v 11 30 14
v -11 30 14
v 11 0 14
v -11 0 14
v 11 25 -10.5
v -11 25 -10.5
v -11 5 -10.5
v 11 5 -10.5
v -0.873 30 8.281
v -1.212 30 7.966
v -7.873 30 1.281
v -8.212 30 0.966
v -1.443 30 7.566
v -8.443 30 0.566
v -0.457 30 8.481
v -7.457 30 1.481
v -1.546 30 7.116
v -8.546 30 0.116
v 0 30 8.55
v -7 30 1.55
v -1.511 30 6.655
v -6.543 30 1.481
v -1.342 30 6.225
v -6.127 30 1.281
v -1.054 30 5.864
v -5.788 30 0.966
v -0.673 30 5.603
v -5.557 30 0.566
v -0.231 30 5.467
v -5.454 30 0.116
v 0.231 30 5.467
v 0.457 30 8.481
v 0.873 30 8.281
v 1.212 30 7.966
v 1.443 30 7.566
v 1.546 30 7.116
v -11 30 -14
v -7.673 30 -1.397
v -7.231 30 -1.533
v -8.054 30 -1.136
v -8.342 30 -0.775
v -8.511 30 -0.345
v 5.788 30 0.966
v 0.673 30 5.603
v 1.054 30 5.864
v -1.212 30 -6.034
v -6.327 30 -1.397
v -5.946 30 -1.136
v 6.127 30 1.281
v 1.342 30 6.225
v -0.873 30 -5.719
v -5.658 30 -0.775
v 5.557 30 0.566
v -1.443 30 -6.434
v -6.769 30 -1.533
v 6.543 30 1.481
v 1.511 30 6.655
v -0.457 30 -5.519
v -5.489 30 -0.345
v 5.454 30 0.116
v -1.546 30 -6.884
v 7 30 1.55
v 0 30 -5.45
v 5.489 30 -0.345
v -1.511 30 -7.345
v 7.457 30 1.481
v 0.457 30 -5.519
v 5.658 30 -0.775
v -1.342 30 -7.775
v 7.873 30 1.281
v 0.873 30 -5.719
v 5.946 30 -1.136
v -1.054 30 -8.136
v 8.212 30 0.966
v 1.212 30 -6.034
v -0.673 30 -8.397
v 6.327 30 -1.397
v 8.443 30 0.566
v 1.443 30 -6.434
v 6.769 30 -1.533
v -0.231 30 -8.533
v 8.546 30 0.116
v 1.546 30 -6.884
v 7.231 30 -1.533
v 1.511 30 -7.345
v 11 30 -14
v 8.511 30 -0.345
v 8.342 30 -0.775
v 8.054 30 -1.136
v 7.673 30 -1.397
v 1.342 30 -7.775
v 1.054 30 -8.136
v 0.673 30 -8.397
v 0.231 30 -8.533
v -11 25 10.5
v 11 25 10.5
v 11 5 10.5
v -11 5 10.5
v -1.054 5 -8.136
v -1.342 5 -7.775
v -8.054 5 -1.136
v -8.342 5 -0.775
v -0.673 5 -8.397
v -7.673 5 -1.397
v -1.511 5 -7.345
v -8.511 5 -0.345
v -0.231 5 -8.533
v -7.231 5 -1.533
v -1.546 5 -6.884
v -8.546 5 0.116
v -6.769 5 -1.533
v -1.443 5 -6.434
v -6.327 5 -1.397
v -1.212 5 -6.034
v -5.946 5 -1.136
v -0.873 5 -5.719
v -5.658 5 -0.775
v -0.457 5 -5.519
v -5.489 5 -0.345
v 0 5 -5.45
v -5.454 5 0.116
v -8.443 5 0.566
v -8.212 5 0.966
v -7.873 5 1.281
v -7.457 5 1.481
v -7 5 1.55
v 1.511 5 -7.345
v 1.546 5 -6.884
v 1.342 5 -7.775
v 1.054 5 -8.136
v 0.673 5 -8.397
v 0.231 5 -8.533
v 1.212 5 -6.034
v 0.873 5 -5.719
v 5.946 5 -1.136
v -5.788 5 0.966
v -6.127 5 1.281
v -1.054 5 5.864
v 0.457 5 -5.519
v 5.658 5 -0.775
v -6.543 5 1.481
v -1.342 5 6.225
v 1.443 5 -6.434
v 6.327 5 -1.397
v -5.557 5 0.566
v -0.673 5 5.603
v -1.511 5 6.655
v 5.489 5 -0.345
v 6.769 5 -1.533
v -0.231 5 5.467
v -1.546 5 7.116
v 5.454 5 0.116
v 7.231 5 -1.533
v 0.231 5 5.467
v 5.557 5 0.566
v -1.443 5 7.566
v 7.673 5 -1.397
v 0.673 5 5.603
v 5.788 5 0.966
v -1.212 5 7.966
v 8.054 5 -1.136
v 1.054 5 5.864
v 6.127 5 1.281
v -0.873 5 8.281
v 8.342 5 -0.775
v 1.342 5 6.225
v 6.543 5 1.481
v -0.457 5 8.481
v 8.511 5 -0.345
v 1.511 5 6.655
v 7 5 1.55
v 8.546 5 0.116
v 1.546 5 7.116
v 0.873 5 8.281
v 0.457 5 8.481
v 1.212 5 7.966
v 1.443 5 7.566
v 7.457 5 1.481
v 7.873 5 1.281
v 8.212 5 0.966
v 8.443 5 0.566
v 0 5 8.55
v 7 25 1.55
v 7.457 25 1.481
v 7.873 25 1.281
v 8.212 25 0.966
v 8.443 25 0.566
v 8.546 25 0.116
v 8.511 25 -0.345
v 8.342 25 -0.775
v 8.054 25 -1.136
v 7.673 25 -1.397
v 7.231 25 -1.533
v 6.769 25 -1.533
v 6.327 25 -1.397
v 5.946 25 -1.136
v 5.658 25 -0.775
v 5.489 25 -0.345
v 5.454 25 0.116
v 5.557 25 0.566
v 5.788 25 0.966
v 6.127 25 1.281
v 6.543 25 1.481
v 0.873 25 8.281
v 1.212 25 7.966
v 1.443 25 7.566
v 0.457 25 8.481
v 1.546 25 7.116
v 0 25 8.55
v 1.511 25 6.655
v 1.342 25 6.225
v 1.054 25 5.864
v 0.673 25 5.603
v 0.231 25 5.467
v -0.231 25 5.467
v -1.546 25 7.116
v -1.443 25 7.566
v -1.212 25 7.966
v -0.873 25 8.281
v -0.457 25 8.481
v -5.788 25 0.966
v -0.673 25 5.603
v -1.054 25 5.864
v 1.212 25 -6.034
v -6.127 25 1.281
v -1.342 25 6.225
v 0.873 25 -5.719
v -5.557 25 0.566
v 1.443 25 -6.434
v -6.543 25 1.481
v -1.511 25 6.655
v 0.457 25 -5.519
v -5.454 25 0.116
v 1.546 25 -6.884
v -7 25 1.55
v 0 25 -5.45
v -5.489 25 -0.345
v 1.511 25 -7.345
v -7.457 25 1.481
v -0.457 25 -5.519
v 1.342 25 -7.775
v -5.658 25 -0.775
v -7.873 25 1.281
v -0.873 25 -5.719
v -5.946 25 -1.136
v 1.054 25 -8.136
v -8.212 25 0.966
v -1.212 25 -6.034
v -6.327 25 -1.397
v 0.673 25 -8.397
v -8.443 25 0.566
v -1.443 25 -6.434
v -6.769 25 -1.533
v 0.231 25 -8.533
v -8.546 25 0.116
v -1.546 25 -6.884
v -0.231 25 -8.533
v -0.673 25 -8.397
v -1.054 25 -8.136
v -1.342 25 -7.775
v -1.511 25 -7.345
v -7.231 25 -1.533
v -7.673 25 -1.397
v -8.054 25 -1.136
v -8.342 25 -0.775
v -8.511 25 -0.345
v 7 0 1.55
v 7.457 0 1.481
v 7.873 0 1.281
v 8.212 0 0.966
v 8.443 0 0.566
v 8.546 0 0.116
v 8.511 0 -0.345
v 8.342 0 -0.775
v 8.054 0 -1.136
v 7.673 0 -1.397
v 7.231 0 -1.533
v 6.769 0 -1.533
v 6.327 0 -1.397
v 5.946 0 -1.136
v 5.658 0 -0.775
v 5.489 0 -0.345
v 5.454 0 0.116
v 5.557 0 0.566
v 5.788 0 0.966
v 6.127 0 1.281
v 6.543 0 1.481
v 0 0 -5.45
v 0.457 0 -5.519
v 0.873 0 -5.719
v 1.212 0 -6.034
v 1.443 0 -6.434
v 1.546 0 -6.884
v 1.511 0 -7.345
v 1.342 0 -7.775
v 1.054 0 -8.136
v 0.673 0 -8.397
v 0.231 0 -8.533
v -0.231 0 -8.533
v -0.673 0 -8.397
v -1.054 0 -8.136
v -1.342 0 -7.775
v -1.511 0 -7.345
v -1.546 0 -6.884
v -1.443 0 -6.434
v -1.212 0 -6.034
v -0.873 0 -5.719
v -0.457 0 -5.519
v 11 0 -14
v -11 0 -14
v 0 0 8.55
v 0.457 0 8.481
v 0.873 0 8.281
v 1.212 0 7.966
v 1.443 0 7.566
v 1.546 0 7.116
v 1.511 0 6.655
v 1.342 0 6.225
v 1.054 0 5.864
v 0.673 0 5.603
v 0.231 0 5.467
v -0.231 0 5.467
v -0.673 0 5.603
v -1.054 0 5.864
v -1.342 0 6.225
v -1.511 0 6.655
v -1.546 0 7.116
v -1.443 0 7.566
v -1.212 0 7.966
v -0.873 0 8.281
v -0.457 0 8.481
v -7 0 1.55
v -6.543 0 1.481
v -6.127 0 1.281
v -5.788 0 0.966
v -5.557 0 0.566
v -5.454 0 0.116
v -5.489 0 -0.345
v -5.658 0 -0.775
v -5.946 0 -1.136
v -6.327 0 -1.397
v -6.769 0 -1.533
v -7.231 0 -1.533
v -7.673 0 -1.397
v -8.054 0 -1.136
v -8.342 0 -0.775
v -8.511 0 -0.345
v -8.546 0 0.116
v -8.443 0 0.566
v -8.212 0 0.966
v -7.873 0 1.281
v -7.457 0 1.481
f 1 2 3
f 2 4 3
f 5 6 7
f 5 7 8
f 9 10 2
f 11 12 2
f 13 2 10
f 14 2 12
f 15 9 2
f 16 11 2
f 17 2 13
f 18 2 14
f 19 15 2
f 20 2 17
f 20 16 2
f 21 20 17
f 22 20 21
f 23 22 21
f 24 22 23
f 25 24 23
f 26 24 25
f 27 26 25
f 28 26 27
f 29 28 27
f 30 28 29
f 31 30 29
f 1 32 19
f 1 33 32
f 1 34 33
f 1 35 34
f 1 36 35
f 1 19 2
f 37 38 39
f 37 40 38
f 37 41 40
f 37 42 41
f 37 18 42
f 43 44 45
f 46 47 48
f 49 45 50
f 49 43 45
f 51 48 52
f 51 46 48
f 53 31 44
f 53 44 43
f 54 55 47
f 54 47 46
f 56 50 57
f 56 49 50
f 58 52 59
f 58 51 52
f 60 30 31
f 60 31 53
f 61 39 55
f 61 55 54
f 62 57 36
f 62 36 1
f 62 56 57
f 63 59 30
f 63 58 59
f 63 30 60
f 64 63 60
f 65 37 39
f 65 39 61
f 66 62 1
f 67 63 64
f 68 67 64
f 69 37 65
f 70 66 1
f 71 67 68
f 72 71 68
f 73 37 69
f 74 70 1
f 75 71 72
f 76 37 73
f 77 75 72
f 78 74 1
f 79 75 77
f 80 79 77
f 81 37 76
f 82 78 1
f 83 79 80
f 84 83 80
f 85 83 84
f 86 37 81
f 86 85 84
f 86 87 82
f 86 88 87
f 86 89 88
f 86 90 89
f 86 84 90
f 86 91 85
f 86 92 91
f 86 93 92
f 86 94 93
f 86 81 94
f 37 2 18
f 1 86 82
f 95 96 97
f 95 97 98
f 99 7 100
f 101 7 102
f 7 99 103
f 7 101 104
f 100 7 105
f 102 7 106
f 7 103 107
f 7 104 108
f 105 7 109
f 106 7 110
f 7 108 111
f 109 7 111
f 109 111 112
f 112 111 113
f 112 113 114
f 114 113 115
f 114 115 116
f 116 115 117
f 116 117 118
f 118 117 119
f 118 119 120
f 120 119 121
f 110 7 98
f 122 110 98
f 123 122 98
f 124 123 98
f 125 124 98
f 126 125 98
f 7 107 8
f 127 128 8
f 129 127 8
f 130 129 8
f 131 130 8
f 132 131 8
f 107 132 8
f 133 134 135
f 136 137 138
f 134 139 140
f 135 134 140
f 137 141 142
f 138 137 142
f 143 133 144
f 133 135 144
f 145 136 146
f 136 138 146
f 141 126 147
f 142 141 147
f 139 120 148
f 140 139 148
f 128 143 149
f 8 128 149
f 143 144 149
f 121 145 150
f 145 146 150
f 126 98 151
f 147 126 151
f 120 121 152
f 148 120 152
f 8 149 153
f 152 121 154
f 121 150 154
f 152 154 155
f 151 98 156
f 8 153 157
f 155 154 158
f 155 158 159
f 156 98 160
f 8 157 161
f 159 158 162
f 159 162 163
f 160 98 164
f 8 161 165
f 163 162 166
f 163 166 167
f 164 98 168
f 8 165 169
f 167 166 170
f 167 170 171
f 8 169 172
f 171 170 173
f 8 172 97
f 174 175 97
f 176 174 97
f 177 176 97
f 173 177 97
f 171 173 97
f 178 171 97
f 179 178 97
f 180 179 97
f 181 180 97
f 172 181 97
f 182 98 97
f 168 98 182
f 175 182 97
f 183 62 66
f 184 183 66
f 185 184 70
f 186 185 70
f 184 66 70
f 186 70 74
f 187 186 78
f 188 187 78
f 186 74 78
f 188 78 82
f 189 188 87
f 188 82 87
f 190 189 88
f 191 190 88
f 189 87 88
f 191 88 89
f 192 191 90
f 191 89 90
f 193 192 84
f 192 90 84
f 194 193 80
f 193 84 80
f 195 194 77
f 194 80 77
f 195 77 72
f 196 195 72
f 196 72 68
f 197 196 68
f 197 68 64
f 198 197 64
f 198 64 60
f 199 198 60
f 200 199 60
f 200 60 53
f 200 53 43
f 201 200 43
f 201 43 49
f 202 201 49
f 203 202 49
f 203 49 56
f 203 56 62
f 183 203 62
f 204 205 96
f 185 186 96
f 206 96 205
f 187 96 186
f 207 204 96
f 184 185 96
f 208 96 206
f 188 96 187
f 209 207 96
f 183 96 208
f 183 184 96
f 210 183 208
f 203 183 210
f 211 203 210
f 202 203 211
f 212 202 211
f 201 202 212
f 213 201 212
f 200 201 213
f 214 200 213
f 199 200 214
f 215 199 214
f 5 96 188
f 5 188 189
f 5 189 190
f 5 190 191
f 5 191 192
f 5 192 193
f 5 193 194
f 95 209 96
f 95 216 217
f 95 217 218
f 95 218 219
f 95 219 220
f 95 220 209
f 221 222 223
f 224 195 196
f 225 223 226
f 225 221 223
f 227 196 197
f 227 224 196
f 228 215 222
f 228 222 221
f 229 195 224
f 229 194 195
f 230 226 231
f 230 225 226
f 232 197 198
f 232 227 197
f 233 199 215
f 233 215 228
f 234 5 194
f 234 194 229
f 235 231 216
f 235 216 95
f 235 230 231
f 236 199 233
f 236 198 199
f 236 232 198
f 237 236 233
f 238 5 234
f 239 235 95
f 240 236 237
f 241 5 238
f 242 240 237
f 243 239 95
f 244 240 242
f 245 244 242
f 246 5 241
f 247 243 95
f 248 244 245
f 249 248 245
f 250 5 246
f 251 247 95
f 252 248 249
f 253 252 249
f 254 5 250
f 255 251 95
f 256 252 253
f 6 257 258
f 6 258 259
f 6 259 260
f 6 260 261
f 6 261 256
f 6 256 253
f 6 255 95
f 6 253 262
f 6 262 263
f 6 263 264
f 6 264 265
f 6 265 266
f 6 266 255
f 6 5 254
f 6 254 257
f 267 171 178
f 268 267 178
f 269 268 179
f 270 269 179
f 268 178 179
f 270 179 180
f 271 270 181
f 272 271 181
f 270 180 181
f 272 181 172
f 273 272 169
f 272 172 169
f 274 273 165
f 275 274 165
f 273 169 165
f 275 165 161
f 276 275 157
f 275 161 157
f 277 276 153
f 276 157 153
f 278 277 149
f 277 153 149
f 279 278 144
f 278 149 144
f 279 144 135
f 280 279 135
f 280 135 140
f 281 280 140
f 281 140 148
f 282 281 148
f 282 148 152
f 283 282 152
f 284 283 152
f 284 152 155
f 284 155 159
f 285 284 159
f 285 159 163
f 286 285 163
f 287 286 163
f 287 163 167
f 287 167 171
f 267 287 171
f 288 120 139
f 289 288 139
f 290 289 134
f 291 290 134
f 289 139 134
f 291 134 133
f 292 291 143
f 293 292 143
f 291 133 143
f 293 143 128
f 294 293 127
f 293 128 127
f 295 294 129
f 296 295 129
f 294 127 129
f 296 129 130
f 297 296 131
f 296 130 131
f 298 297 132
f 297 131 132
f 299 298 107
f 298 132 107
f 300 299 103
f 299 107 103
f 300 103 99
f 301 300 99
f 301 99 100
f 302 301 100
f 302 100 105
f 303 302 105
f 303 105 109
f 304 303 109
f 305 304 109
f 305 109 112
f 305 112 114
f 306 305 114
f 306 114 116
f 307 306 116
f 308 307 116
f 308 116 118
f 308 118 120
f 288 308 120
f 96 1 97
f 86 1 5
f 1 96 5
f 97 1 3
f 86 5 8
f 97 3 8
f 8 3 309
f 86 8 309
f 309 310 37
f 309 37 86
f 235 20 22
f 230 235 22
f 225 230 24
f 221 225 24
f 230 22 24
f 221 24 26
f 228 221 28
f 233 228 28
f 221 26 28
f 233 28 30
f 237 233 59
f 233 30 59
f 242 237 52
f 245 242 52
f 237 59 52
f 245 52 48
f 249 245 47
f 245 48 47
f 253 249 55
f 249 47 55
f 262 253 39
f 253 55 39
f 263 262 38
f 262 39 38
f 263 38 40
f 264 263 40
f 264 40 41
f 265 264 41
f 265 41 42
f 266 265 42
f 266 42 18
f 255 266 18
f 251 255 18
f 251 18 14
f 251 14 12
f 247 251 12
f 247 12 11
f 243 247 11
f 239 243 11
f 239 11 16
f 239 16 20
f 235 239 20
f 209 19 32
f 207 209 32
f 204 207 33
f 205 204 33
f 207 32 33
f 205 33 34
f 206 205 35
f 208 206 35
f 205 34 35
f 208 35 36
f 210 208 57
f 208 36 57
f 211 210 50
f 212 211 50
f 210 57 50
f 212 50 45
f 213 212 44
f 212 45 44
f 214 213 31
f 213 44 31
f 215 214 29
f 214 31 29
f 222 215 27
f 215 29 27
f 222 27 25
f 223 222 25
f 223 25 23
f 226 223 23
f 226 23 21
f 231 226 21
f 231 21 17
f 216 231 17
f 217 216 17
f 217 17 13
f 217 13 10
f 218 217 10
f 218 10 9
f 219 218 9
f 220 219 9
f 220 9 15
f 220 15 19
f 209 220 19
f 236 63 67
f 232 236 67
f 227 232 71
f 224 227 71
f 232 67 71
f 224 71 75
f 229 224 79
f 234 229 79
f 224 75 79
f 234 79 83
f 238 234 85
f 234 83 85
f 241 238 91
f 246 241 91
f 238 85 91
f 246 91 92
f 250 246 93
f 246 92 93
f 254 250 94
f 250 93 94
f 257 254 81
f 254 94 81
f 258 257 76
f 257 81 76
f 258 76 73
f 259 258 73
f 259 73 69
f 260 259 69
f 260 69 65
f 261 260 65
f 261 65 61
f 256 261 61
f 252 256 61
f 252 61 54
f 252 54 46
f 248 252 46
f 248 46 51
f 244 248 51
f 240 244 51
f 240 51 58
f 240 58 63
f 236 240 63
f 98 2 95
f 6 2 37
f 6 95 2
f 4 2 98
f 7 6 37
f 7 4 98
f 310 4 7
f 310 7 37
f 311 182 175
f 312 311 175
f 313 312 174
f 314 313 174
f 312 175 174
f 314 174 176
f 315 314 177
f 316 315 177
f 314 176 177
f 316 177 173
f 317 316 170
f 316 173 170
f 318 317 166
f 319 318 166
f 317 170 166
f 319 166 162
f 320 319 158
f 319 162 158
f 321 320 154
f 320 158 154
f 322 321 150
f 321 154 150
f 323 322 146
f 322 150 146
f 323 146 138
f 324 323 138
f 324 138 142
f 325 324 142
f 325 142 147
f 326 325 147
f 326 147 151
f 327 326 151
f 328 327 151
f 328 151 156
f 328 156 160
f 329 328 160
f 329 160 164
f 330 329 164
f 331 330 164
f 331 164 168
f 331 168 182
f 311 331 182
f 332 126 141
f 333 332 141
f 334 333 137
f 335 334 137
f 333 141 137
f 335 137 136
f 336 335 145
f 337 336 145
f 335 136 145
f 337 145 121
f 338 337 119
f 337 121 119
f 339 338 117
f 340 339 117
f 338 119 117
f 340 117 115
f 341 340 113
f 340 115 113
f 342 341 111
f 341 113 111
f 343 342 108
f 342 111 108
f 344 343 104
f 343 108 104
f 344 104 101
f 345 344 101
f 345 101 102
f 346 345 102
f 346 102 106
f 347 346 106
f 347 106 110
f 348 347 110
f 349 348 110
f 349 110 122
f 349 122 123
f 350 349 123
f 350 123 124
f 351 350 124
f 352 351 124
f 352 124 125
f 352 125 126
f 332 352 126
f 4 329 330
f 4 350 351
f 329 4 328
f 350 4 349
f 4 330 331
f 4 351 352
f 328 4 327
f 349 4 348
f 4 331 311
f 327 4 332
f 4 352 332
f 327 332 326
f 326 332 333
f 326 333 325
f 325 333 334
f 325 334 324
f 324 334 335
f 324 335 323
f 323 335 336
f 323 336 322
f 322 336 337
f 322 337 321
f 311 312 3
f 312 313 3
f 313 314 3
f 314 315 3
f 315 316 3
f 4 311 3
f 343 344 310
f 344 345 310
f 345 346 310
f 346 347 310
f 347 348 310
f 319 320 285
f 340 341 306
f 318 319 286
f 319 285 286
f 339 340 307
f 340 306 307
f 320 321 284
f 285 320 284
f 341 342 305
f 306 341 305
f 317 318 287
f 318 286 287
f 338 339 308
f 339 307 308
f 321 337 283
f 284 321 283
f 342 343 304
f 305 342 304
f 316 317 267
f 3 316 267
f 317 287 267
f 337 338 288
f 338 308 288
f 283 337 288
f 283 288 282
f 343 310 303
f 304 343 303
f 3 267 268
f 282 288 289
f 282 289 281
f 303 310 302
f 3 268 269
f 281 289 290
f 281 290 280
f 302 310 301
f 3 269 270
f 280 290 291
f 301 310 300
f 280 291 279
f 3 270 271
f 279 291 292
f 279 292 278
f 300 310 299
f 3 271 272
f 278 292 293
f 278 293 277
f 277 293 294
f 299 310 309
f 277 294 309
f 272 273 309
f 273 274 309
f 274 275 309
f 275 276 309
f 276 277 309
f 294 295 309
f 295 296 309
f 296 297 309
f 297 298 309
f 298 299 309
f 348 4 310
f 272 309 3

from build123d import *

# Parameters (mm, degrees)
SKETCH1_W           = 22
SKETCH1_H           = 28
BOSS_EXTRUDE1_DEPTH = 5
SKETCH2_W           = 22
SKETCH2_H           = 5
BOSS_EXTRUDE2_DEPTH = 20
SKETCH3_W           = 22
SKETCH3_H           = 28
BOSS_EXTRUDE3_DEPTH = 5
SKETCH4_R           = 1.55
CUT_EXTRUDE1_DEPTH  = 30
SKETCH5_W           = 22
SKETCH5_H           = 20
CUT_EXTRUDE2_DEPTH  = 1.5
SKETCH6_W           = 22
SKETCH6_H           = 20
CUT_EXTRUDE3_DEPTH  = 1.5


with BuildPart() as part:
    # Sketch1 → Boss-Extrude1 (new body)
    with BuildSketch(Plane(origin=(0, 0, 0), x_dir=(1, 0, 0), z_dir=(0, 1, 0))):
        Rectangle(SKETCH1_W, SKETCH1_H)
    extrude(amount=BOSS_EXTRUDE1_DEPTH)

    # Sketch2 → Boss-Extrude2 (add)
    with BuildSketch(Plane(origin=(0, 5, 0), x_dir=(1, 0, 0), z_dir=(0, 1, 0))):
        with Locations((0, -11.5)):
            Rectangle(SKETCH2_W, SKETCH2_H)
        with Locations((0, 11.5)):
            Rectangle(SKETCH2_W, SKETCH2_H)
    extrude(amount=BOSS_EXTRUDE2_DEPTH)

    # Sketch3 → Boss-Extrude3 (add)
    with BuildSketch(Plane(origin=(0, 25, 0), x_dir=(1, 0, 0), z_dir=(0, 1, 0))):
        Rectangle(SKETCH3_W, SKETCH3_H)
    extrude(amount=BOSS_EXTRUDE3_DEPTH)

    # Sketch4 → Cut-Extrude1 (cut)
    with BuildSketch(Plane(origin=(0, 30, 0), x_dir=(1, 0, 0), z_dir=(0, 1, 0))):
        with Locations(Location((0, 7, 0), (0, 0, 270))):
            Circle(SKETCH4_R)
        with Locations(Location((7, 0, 0), (0, 0, 270))):
            Circle(SKETCH4_R)
        with Locations(Location((0, -7, 0), (0, 0, 270))):
            Circle(SKETCH4_R)
        with Locations(Location((-7, 0, 0), (0, 0, 270))):
            Circle(SKETCH4_R)
    extrude(amount=-CUT_EXTRUDE1_DEPTH, mode=Mode.SUBTRACT)

    # Sketch5 → Cut-Extrude2 (cut)
    with BuildSketch(Plane.XY.offset(-9)):
        with Locations((0, 15)):
            Rectangle(SKETCH5_W, SKETCH5_H)
    extrude(amount=-CUT_EXTRUDE2_DEPTH, mode=Mode.SUBTRACT)

    # Sketch6 → Cut-Extrude3 (cut)
    with BuildSketch(Plane(origin=(0, 0, 9), x_dir=(-1, 0, 0), z_dir=(0, 0, -1))):
        with Locations((0, 15)):
            Rectangle(SKETCH6_W, SKETCH6_H)
    extrude(amount=-CUT_EXTRUDE3_DEPTH, mode=Mode.SUBTRACT)


solid = part.part
